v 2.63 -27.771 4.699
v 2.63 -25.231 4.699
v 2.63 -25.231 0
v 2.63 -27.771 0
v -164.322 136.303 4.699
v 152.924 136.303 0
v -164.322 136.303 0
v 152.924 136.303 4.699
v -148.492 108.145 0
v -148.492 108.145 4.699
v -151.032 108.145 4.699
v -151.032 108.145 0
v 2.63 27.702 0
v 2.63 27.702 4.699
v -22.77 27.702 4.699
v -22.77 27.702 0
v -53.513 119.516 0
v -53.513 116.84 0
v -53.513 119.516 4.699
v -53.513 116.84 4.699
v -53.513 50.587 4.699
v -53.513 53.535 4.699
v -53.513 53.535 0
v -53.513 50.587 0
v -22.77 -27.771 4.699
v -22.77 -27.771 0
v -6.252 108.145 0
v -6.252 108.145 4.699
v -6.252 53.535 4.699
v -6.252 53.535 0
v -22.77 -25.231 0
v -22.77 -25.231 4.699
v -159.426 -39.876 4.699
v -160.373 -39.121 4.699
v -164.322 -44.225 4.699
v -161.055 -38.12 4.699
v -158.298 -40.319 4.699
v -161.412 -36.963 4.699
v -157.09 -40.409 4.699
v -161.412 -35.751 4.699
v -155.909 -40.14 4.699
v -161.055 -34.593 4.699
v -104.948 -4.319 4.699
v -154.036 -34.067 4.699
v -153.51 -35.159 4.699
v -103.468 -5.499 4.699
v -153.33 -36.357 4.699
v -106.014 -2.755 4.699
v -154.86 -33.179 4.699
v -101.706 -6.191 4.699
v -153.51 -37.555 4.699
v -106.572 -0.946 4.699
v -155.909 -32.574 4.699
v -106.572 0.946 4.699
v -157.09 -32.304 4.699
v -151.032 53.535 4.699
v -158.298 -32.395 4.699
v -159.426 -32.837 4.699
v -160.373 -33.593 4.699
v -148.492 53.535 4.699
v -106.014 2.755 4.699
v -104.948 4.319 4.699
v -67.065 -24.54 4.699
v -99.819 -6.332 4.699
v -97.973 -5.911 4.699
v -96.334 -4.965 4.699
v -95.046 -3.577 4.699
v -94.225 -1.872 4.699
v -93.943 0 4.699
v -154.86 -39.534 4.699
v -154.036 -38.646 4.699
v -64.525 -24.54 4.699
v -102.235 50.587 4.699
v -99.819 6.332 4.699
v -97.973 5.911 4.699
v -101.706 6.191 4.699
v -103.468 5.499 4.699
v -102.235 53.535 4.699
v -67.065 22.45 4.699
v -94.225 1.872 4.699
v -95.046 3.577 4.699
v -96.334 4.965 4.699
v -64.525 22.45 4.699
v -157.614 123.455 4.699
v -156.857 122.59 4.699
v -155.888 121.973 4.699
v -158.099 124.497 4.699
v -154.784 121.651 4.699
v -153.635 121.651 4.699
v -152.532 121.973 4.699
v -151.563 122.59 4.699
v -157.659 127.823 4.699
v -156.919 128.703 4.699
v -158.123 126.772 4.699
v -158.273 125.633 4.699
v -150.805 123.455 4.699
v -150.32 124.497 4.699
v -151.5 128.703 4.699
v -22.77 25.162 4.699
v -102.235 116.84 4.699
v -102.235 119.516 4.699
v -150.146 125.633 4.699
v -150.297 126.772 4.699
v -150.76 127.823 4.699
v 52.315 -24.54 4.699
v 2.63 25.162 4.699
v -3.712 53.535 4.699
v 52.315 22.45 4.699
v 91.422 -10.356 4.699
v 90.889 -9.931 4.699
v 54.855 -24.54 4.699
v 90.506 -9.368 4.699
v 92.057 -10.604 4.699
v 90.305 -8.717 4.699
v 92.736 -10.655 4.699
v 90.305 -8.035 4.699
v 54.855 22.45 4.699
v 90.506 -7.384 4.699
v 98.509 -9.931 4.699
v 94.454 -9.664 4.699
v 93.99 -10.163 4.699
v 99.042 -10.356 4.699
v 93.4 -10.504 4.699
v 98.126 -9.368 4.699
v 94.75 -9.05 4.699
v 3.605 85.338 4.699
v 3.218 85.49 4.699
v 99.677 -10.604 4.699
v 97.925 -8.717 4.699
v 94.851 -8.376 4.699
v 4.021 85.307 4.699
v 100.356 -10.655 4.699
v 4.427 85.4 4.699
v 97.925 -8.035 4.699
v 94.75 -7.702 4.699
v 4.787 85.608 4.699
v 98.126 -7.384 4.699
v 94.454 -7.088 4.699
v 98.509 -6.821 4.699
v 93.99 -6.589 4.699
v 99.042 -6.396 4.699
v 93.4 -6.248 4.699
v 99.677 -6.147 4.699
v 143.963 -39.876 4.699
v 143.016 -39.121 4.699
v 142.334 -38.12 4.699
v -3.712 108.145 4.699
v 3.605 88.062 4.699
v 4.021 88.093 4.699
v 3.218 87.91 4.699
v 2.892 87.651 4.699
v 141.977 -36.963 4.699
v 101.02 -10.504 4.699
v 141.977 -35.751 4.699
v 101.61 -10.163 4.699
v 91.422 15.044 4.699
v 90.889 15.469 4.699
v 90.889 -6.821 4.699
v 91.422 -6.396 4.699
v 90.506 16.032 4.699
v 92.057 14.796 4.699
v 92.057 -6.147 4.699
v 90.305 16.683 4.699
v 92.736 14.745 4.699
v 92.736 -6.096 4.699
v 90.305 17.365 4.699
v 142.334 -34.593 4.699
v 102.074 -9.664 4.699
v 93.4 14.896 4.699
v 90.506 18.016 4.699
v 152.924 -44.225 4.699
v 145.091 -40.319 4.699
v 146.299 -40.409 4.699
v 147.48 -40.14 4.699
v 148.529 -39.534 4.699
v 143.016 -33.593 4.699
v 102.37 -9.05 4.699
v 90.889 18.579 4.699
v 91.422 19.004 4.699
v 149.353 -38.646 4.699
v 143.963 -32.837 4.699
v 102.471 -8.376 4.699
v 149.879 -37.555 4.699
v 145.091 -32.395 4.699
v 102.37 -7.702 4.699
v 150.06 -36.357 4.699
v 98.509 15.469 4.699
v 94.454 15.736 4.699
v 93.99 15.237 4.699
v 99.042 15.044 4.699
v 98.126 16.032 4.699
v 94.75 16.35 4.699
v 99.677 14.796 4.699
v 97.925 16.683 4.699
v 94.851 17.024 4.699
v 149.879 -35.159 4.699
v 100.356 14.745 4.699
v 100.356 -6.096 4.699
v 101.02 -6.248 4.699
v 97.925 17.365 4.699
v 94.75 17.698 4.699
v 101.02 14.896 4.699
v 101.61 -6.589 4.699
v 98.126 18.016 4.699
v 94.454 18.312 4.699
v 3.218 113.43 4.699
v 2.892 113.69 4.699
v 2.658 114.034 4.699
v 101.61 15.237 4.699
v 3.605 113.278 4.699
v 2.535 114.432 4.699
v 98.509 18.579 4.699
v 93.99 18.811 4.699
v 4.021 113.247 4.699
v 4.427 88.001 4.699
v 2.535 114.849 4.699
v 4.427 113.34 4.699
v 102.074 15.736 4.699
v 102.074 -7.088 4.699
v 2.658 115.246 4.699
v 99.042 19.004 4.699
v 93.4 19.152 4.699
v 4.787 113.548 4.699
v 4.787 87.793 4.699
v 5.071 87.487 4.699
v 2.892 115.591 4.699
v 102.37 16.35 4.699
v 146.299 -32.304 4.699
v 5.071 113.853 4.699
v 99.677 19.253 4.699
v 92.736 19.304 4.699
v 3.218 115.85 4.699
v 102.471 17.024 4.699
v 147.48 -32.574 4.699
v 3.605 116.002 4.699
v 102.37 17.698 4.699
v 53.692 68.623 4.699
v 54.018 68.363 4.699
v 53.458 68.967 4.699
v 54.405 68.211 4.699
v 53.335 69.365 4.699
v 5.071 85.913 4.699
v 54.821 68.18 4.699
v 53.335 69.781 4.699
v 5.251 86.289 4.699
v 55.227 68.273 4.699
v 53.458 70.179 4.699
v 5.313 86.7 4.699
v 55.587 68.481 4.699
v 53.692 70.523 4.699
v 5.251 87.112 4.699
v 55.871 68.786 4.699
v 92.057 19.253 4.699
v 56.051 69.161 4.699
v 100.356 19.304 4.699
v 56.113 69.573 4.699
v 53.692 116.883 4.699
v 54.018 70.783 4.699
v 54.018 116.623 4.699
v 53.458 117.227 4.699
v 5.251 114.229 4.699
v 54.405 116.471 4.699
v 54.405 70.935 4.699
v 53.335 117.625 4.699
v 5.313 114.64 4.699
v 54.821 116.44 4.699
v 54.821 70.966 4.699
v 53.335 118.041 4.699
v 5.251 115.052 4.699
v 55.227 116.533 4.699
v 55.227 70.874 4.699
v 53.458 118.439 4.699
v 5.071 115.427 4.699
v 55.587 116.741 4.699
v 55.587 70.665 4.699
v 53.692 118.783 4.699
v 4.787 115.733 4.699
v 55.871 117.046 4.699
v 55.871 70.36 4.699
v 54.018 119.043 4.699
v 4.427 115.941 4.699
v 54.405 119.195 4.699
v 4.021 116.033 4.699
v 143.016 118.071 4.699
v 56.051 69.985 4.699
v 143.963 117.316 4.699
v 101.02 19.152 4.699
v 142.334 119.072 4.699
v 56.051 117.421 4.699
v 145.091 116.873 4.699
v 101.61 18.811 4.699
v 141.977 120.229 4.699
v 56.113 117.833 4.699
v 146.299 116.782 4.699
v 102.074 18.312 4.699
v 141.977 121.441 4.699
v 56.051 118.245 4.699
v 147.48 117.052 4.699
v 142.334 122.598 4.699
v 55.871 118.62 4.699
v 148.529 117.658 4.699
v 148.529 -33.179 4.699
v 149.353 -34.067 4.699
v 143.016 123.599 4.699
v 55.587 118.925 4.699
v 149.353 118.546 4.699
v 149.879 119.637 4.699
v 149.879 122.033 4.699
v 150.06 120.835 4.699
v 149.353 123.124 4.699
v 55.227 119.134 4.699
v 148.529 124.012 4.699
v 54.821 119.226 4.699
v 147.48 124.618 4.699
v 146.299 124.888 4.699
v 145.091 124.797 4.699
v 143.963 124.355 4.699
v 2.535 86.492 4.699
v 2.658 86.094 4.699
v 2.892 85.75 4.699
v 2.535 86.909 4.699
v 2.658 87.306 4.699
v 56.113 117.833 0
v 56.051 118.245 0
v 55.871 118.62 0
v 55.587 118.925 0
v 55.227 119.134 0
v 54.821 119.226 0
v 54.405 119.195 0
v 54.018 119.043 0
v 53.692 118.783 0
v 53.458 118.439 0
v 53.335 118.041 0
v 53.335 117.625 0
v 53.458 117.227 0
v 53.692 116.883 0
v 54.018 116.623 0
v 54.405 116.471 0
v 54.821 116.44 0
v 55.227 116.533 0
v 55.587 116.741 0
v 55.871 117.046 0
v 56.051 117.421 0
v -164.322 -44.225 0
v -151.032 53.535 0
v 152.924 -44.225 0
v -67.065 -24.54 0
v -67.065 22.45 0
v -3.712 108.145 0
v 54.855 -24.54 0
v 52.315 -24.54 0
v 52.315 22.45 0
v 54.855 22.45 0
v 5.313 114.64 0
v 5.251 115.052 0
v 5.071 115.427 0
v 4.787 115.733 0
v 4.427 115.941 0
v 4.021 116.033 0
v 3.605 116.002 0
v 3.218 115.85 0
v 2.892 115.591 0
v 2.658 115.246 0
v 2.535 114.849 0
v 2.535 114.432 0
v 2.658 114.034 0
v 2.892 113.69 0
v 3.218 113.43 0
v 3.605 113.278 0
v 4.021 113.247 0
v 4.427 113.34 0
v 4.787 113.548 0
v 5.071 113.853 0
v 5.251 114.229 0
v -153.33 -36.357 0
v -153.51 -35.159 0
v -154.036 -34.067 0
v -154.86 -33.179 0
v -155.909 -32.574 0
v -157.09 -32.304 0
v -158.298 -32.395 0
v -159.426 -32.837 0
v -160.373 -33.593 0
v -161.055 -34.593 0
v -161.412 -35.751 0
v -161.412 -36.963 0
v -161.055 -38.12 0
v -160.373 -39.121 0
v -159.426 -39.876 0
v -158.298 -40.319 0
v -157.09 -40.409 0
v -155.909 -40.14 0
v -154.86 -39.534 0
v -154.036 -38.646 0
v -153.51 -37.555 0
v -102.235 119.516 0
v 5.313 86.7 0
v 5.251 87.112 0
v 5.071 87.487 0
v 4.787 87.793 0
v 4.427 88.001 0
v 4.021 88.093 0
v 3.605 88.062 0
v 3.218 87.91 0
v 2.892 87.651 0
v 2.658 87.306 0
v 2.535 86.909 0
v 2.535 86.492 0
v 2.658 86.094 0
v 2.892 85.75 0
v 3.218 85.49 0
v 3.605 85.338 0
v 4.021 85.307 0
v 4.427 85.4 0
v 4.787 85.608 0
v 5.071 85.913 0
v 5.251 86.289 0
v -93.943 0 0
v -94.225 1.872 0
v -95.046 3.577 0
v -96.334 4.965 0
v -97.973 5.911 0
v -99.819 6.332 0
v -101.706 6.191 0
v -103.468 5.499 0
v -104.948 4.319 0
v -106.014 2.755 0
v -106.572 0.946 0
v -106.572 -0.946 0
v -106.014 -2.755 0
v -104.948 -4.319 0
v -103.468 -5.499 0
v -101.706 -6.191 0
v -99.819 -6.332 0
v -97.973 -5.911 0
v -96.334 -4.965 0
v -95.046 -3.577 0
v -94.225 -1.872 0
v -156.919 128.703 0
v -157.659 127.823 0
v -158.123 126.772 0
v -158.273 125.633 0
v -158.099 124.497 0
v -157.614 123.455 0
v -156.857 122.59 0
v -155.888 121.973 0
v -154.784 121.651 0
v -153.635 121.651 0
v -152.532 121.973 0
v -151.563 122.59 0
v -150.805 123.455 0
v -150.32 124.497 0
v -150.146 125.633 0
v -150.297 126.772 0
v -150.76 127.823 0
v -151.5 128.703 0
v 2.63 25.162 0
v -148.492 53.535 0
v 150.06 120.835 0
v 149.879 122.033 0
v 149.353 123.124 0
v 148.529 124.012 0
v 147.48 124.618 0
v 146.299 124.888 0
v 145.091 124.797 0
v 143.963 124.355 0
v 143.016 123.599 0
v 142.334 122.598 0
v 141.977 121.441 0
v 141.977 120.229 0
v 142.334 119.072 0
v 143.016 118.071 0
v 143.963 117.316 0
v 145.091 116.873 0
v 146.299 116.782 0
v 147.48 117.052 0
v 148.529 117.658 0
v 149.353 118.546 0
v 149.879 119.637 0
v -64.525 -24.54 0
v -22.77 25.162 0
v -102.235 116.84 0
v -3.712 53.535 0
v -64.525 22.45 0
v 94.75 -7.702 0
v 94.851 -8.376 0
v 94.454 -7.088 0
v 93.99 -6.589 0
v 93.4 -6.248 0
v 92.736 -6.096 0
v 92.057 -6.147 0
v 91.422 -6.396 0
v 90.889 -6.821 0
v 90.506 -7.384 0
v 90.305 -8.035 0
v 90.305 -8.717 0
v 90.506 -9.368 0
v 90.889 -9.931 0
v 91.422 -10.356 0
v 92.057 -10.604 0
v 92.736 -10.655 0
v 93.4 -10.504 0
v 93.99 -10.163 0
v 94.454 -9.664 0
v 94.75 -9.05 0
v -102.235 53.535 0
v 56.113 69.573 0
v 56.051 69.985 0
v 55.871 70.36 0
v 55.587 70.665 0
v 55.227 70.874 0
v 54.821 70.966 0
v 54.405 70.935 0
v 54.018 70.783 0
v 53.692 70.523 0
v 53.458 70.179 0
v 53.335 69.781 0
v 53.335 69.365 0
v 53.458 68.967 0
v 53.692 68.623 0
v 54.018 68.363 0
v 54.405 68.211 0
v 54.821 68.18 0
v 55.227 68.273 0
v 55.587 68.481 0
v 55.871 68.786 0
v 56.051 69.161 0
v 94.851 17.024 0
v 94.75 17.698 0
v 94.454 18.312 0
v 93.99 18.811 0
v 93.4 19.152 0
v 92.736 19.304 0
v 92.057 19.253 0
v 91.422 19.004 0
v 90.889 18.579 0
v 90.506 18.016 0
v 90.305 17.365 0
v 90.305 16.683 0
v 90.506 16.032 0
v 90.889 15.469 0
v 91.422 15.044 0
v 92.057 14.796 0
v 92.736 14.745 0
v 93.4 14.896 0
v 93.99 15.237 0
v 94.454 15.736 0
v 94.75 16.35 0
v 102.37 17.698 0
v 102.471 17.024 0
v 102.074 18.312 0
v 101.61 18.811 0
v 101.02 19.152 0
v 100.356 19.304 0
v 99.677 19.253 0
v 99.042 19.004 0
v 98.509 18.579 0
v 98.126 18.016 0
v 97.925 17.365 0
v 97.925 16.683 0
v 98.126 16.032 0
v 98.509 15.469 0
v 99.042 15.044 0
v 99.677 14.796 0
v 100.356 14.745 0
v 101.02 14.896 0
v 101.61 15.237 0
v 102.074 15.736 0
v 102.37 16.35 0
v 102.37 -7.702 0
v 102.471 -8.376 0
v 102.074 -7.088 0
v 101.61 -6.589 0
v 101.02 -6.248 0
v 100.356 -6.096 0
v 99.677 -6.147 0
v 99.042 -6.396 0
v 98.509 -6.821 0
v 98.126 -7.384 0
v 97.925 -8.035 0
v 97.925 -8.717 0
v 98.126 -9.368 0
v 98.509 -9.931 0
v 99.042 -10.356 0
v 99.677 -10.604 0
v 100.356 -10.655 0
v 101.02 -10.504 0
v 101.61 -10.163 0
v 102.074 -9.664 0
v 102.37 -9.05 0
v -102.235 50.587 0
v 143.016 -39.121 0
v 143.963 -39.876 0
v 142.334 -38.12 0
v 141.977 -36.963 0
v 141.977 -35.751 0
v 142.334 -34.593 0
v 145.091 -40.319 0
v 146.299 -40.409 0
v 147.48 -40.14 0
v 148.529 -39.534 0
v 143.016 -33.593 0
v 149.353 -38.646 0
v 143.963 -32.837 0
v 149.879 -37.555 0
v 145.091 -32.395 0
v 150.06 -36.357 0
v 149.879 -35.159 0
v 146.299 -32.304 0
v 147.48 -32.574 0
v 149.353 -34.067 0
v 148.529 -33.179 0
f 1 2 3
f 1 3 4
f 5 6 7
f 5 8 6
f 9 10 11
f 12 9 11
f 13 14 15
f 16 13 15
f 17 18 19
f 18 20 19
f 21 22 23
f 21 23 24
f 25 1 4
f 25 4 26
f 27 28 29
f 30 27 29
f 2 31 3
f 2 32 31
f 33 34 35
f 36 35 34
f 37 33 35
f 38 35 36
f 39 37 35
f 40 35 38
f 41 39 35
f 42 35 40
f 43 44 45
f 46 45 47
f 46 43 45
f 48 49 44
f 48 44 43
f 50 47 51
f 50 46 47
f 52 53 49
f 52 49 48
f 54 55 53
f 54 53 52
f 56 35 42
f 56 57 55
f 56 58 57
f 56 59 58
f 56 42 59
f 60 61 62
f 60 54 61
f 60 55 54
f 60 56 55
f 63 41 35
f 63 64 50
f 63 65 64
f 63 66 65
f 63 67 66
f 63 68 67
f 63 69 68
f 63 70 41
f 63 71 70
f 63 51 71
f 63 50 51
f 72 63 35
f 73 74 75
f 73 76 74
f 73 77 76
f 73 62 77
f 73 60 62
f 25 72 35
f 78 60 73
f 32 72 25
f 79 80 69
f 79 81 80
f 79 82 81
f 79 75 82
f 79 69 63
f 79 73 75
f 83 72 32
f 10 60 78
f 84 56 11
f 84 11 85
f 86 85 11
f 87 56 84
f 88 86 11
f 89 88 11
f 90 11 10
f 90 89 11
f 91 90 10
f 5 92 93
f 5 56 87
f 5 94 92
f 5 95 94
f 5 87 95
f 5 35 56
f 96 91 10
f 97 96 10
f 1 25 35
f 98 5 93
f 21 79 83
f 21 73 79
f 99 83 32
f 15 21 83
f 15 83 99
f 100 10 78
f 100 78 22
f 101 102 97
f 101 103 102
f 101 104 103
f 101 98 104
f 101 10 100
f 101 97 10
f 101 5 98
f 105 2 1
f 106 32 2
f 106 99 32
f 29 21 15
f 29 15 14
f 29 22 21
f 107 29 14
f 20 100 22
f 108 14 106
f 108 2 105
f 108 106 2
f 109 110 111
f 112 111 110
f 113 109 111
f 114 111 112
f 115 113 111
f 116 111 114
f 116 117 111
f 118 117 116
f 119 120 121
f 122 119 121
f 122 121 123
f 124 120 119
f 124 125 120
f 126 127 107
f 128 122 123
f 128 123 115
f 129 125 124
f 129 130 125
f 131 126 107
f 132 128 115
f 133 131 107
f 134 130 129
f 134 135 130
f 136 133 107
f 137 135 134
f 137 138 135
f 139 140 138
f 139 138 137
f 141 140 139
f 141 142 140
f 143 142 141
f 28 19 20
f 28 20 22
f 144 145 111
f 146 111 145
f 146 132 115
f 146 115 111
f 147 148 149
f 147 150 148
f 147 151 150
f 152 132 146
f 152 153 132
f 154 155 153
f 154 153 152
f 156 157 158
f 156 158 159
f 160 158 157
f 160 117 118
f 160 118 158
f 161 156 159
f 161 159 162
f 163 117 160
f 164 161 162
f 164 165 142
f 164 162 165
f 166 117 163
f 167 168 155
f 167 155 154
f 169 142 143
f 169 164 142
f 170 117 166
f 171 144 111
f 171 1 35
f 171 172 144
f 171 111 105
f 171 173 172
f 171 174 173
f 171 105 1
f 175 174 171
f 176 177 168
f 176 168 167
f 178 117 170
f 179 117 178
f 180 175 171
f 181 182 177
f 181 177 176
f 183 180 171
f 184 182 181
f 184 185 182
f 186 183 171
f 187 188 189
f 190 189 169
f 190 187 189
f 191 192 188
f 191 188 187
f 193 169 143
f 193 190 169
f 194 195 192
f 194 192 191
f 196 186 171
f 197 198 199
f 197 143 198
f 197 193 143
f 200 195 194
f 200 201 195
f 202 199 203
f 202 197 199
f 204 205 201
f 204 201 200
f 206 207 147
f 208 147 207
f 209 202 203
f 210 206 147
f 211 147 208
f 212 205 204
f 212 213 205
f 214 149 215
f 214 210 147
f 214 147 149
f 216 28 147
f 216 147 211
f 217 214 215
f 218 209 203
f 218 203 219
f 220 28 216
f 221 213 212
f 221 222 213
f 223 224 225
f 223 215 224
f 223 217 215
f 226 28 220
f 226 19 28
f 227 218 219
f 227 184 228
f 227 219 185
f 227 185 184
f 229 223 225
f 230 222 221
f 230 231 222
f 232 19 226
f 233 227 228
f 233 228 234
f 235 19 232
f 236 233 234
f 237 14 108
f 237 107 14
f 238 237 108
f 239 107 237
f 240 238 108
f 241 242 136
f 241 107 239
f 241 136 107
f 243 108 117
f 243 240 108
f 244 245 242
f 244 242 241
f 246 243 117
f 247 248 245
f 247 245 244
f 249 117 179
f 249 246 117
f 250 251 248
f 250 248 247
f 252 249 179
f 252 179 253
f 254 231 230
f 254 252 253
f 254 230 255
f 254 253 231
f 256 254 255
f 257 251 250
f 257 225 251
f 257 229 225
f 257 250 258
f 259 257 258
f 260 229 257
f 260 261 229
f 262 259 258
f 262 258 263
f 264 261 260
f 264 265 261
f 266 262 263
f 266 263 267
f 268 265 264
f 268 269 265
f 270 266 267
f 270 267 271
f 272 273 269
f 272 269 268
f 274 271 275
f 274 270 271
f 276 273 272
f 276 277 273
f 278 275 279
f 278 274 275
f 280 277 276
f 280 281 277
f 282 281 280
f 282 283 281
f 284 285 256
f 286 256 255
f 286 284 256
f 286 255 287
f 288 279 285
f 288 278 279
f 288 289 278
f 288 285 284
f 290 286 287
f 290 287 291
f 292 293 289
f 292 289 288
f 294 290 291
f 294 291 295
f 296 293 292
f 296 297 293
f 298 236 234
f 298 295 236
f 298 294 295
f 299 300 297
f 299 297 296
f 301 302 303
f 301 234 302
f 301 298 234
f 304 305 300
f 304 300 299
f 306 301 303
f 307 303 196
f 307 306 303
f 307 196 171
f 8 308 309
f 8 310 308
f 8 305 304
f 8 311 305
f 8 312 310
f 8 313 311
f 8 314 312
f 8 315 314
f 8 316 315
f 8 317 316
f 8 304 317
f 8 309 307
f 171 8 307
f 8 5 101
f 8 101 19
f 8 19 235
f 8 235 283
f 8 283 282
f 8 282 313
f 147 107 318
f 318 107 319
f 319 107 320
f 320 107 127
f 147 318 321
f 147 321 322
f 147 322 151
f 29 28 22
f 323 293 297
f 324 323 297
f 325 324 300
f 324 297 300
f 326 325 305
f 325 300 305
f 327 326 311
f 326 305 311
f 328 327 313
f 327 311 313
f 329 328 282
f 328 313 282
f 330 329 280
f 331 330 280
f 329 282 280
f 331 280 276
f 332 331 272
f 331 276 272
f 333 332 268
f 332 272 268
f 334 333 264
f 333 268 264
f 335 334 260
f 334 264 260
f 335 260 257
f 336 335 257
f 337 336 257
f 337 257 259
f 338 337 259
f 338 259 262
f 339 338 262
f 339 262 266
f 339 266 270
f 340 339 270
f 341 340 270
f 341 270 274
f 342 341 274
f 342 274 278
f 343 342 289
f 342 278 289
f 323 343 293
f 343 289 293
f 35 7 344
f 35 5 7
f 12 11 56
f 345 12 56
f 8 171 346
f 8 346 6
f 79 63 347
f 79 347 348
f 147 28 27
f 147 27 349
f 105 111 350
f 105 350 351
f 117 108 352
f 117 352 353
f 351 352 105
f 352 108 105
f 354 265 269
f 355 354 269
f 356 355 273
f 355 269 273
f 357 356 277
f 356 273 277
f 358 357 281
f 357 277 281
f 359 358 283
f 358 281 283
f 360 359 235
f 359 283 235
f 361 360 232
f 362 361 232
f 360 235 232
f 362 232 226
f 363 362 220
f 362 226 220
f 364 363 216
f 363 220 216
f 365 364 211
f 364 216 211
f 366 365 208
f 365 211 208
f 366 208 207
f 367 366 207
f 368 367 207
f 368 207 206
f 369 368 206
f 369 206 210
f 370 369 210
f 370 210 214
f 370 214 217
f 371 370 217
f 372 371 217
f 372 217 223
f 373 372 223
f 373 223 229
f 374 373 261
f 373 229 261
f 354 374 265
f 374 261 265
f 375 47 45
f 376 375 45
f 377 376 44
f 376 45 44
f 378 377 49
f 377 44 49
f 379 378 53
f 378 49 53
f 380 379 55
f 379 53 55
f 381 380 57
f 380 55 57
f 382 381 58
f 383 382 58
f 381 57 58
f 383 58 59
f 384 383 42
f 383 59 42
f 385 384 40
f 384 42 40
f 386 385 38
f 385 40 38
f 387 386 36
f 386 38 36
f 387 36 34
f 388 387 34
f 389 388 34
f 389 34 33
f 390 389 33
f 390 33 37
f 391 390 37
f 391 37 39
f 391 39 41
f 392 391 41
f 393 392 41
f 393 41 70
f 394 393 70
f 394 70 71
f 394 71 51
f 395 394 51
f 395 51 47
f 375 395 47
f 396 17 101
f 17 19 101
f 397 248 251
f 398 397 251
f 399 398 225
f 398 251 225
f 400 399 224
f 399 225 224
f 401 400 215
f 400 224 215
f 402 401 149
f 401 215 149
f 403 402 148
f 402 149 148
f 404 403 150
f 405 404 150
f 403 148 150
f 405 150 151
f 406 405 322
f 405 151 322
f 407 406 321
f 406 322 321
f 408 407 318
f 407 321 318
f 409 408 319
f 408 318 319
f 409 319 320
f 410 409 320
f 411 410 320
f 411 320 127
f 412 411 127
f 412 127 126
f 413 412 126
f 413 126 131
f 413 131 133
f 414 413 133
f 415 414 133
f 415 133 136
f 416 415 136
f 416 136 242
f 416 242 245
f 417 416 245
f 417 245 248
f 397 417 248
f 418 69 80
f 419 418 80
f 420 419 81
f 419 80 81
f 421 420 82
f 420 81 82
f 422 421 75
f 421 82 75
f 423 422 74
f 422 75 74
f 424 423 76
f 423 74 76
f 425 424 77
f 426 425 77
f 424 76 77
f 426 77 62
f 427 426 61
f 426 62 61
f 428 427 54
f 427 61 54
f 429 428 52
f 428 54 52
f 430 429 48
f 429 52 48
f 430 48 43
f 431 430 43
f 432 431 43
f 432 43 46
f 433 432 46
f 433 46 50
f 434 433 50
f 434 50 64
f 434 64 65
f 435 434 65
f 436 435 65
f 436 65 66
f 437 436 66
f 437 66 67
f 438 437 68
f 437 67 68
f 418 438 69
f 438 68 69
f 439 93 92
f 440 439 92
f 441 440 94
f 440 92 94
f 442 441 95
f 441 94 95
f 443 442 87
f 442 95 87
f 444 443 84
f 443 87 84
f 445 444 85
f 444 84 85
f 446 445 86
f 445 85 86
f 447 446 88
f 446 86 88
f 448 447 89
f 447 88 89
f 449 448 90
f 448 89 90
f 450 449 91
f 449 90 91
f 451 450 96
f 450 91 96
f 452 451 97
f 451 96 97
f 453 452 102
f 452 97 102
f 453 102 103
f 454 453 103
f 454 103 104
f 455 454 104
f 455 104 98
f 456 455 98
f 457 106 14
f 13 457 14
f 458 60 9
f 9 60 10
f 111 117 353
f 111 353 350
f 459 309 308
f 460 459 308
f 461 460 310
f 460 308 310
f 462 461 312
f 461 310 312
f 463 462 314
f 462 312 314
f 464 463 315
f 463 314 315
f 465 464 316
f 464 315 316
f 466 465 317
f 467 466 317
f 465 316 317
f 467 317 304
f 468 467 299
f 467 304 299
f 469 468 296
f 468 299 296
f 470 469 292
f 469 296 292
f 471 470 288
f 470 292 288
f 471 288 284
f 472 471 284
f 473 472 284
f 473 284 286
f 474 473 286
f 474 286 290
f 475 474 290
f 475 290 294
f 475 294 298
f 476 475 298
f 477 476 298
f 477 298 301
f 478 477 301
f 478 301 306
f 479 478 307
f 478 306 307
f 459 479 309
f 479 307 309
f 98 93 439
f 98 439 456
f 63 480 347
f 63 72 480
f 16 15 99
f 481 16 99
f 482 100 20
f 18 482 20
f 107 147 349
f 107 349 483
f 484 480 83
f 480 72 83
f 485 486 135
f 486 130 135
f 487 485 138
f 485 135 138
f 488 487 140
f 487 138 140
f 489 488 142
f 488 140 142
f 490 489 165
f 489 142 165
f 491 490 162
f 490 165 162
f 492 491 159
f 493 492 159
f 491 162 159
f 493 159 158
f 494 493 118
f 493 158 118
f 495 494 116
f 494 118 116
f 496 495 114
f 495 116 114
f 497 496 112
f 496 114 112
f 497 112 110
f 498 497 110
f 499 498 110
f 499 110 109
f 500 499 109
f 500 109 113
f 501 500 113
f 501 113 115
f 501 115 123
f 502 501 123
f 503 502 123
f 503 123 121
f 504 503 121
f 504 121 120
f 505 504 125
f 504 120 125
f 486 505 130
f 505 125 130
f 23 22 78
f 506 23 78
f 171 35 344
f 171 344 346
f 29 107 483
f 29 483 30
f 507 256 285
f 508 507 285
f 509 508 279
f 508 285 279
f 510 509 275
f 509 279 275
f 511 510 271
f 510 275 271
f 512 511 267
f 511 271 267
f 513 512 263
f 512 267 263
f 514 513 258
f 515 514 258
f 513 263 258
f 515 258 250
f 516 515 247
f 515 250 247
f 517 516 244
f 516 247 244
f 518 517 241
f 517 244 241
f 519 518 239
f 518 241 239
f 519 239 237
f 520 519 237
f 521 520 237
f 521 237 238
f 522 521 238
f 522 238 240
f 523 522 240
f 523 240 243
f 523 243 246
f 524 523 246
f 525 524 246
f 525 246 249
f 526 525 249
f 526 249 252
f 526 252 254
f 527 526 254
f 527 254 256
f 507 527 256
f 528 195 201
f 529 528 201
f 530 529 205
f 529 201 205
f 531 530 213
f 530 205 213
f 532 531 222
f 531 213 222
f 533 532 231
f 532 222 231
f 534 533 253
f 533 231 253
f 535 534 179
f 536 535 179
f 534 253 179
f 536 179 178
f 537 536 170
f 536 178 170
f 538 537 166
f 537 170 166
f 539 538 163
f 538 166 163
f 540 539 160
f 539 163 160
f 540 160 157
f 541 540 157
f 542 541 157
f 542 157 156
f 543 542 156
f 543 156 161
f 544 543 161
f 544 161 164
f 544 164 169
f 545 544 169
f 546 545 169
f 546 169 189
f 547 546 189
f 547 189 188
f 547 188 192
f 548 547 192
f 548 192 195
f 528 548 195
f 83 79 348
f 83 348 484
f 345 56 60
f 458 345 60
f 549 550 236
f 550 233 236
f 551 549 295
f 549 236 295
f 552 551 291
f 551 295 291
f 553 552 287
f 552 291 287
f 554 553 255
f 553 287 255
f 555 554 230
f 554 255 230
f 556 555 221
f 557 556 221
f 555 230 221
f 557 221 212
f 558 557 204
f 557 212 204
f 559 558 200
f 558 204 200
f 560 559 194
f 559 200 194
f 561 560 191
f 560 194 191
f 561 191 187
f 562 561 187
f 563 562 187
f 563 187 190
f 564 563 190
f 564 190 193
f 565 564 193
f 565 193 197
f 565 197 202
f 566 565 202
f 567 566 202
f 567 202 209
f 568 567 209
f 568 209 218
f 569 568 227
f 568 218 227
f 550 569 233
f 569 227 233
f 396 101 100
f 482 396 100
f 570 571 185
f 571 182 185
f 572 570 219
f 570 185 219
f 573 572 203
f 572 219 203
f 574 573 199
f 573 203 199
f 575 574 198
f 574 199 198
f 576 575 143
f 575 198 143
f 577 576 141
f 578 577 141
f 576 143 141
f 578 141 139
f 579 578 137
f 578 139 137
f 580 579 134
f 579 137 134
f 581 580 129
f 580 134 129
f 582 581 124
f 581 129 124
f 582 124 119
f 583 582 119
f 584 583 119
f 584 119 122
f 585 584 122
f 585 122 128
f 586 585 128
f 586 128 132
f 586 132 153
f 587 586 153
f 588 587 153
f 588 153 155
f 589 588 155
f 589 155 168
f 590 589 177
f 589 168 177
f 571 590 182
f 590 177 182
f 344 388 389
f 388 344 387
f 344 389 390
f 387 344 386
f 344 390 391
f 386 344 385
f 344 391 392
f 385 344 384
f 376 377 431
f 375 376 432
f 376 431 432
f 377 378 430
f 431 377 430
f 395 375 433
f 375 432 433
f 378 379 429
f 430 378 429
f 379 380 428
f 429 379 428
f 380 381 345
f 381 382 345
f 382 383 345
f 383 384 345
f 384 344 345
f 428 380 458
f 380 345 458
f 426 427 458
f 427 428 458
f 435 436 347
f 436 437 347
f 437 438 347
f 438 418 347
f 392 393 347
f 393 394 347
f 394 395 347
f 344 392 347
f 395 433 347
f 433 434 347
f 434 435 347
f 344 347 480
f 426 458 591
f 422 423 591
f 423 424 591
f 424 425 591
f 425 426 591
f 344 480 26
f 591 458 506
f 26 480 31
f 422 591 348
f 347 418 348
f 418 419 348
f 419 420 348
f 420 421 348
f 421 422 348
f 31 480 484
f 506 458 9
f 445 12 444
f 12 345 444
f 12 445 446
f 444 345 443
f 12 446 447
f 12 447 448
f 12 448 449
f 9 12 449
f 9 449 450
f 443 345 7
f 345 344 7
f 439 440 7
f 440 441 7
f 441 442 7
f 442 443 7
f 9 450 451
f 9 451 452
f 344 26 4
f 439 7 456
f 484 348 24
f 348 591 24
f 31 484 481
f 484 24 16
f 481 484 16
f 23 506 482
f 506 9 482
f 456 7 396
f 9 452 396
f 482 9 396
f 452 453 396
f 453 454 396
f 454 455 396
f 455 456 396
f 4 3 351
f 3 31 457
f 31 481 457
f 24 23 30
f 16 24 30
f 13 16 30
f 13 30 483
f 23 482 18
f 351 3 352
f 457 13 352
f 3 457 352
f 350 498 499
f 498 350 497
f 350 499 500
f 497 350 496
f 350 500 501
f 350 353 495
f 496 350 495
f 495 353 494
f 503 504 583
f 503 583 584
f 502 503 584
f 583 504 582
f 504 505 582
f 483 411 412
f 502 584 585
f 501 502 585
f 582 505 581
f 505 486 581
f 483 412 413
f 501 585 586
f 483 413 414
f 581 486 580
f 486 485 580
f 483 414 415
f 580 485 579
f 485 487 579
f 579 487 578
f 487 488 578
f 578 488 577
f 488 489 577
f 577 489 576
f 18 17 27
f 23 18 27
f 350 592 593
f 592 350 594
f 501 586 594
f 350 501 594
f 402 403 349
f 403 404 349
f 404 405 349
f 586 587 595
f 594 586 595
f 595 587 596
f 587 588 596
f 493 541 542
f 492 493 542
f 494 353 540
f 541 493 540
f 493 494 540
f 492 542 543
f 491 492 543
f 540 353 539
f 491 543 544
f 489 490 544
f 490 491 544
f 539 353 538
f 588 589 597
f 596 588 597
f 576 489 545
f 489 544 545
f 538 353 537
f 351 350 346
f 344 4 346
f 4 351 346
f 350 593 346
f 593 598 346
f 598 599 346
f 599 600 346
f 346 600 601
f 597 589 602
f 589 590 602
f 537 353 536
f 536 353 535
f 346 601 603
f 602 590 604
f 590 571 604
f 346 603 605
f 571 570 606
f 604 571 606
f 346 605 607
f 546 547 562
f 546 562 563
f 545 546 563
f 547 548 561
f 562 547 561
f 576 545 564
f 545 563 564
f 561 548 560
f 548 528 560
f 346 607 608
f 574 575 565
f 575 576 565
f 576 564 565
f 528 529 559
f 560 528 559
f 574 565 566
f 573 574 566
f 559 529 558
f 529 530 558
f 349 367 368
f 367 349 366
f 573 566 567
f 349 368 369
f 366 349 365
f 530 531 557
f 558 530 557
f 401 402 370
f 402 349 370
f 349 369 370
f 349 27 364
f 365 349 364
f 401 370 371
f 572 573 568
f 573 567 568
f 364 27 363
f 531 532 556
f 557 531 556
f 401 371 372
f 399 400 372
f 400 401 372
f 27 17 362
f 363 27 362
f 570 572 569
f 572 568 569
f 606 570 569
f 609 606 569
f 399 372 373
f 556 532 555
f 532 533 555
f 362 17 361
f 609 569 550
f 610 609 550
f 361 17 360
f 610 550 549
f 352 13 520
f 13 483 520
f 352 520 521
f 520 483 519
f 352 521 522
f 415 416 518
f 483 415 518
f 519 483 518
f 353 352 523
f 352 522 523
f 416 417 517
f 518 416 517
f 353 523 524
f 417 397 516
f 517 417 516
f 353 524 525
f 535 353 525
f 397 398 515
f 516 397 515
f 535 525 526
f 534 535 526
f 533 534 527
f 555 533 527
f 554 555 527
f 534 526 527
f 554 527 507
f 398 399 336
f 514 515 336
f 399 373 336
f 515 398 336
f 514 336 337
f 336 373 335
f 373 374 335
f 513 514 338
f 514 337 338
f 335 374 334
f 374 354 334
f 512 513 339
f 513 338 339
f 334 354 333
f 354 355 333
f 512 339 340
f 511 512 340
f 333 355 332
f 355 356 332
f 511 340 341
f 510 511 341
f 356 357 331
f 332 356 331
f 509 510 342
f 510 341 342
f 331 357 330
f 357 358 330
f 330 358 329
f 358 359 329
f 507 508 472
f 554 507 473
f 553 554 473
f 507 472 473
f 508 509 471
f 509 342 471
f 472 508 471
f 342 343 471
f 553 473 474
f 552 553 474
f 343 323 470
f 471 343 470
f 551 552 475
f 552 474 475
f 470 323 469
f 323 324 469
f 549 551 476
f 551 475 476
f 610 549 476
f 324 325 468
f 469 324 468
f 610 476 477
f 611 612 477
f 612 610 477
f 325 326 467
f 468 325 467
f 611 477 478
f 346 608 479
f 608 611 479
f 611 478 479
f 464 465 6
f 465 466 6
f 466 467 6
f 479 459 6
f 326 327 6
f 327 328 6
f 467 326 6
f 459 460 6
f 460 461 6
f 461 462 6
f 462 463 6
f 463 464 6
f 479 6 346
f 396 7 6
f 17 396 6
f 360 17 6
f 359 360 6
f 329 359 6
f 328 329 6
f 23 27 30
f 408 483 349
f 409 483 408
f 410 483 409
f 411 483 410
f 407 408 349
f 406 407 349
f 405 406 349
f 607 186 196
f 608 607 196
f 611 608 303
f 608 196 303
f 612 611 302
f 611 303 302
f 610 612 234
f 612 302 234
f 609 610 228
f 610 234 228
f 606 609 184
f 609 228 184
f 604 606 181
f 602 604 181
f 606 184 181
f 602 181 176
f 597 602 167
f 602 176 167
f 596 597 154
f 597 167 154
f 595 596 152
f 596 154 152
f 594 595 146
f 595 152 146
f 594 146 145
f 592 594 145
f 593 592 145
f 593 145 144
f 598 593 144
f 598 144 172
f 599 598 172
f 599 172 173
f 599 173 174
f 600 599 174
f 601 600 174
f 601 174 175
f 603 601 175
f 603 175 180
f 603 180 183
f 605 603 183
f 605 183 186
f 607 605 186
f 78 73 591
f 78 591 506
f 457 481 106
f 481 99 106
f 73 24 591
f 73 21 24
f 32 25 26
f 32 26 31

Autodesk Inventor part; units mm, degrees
ref_plane "YZ Plane" through (0, 0, 0) normal (1, 0, 0) x (0, 1, 0)
ref_plane "XZ Plane" through (0, 0, 0) normal (0, 1, 0) x (-1, 0, 0)
ref_plane "XY Plane" through (0, 0, 0) normal (0, 0, 1) x (1, 0, 0)
sketch "Sketch1" plane through (0, 0, 0) normal (0, 0, 1) x (1, 0, 0)
  line L0 (-164.322, 128.7031) -> (152.924, 128.7031)
  line L1 (152.924, 128.7031) -> (152.924, -133.4523)
  line L2 (152.924, -133.4523) -> (-164.322, -133.4523)
  line L3 (-164.322, -133.4523) -> (-164.322, 128.7031)
  point P0 (0, 0)
  dimension "d0" = 317.246
extrude "Extrusion1" add sketch "Sketch1" along normal blind 4.699
sketch "Sketch2" plane through (0, 0, 4.699) normal (0, 0, 1) x (1, 0, 0)
  line L0 (-22.7697, 25.1619) -> (2.6303, 25.1619)
  line L1 (52.3147, 22.4498) -> (52.3147, -24.5402)
  line L2 (-64.5253, -24.5402) -> (-64.5253, 22.4498)
  line L3 (52.3147, 22.4498) -> (54.8547, 22.4498)
  line L4 (54.8547, 22.4498) -> (54.8547, -24.5402)
  line L5 (54.8547, -24.5402) -> (52.3147, -24.5402)
  line L6 (52.3147, -24.5402) -> (52.3147, 22.4498)
  line L7 (-64.5253, -24.5402) -> (-67.0653, -24.5402)
  line L8 (-67.0653, -24.5402) -> (-67.0653, 22.4498)
  line L9 (-67.0653, 22.4498) -> (-64.5253, 22.4498)
  line L10 (-64.5253, 22.4498) -> (-64.5253, -24.5402)
  line L11 (-22.7697, 25.1619) -> (2.6303, 25.1619)
  line L12 (2.6303, 25.1619) -> (2.6303, 27.7019)
  line L13 (2.6303, 27.7019) -> (-22.7697, 27.7019)
  line L14 (-22.7697, 27.7019) -> (-22.7697, 25.1619)
  line L15 (-22.7697, -25.2309) -> (2.6303, -25.2309)
  line L16 (2.6303, -25.2309) -> (2.6303, -27.7709)
  line L17 (2.6303, -27.7709) -> (-22.7697, -27.7709)
  line L18 (-22.7697, -27.7709) -> (-22.7697, -25.2309)
  circle A0 centre (92.5652, 17.0242) radius 2.286
  circle A1 centre (100.1852, 17.0242) radius 2.286
  circle A2 centre (92.5652, -8.3758) radius 2.286
  circle A3 centre (100.1852, -8.3758) radius 2.286
  line L19 (3.9163, 100.2262) -> (59.1645, 100.2262)
  circle A4 centre (54.7163, 69.5732) radius 1.397
  circle A5 centre (54.7163, 117.8332) radius 1.397
  circle A6 centre (3.9163, 114.6403) radius 1.397
  circle A7 centre (3.9163, 86.7003) radius 1.397
  point P0 (0, 0)
  dimension "d3" = 116.84
  dimension "d4" = 46.99
  dimension "d5" = 2.54
  dimension "d6" = 2.54
  dimension "d7" = 25.4
  dimension "d8" = 2.54
  dimension "d9" = 2.54
  dimension "d12" = 4.572
  dimension "d31" = 25.4
  dimension "d32" = 25.4
extrude "Extrusion2" cut sketch "Sketch2" against normal blind 25.4
sketch "Sketch3" plane through (0, 0, 4.699) normal (0, 0, 1) x (1, 0, 0)
  line L0 (-164.322, 128.7031) -> (-164.322, -133.4523) projected
  line L1 (152.924, 128.7031) -> (152.924, -133.4523) projected
  line L2 (-164.322, -44.2248) -> (152.924, -44.2248)
  line L3 (152.924, -44.2248) -> (152.924, -133.4523)
  line L4 (152.924, -133.4523) -> (-164.322, -133.4523)
  line L5 (-164.322, -133.4523) -> (-164.322, -44.2248)
  point P0 (0, 0)
extrude "Extrusion3" cut sketch "Sketch3" against normal blind 25.4
sketch "Sketch4" plane through (0, 0, 4.699) normal (0, 0, 1) x (1, 0, 0)
  line L0 (-102.2349, 116.84) -> (-53.5128, 116.84)
  line L1 (-6.2523, 108.1454) -> (-6.2523, 44.8408)
  line L2 (-53.5128, 53.5354) -> (-102.2349, 53.5354)
  line L3 (-148.4923, 53.5354) -> (-148.4923, 108.1454)
  line L4 (-148.4923, 108.1454) -> (-151.0323, 108.1454)
  line L5 (-151.0323, 108.1454) -> (-151.0323, 53.5354)
  line L6 (-151.0323, 53.5354) -> (-148.4923, 53.5354)
  line L7 (-148.4923, 53.5354) -> (-148.4923, 108.1454)
  line L8 (-6.2523, 108.1454) -> (-3.7123, 108.1454)
  line L9 (-3.7123, 108.1454) -> (-3.7123, 53.5354)
  line L10 (-3.7123, 53.5354) -> (-6.2523, 53.5354)
  line L11 (-6.2523, 53.5354) -> (-6.2523, 108.1454)
  line L12 (-102.2349, 116.84) -> (-53.5128, 116.84)
  line L13 (-53.5128, 116.84) -> (-53.5128, 119.5161)
  line L14 (-53.5128, 119.5161) -> (-102.2349, 119.5161)
  line L15 (-102.2349, 119.5161) -> (-102.2349, 116.84)
  line L16 (-102.2349, 53.5354) -> (-53.5128, 53.5354)
  line L17 (-53.5128, 53.5354) -> (-53.5128, 50.5868)
  line L18 (-53.5128, 50.5868) -> (-102.2349, 50.5868)
  line L19 (-102.2349, 50.5868) -> (-102.2349, 53.5354)
  circle A0 centre (-100.2931, 0) radius 6.35
  point P0 (0, 0)
  dimension "d21" = 142.24
  dimension "d22" = 2.54
  dimension "d23" = 2.54
  dimension "d24" = 12.7
  dimension "d25" = 54.61
extrude "Extrusion4" cut sketch "Sketch4" against normal blind 25.4
sketch "Sketch5" plane through (0, 0, 4.699) normal (0, 0, 1) x (1, 0, 0)
  circle A0 centre (-154.2096, 125.6742) radius 4.064
  line L0 (-6.2523, 53.5354) -> (-6.2523, 108.1454) projected
  line L1 (-6.2523, 108.1454) -> (-3.7123, 108.1454) projected
  line L2 (-3.7123, 108.1454) -> (-3.7123, 53.5354) projected
  line L3 (-3.7123, 53.5354) -> (-6.2523, 53.5354) projected
  line L4 (-102.2349, 116.84) -> (-102.2349, 119.5161) projected
  line L5 (-102.2349, 119.5161) -> (-53.5128, 119.5161) projected
  line L6 (-53.5128, 119.5161) -> (-53.5128, 116.84) projected
  line L7 (-53.5128, 116.84) -> (-102.2349, 116.84) projected
  circle A1 centre (-100.2931, 0) radius 6.35 projected
  line L8 (-151.0323, 53.5354) -> (-151.0323, 108.1454) projected
  line L9 (-151.0323, 108.1454) -> (-148.4923, 108.1454) projected
  line L10 (-148.4923, 108.1454) -> (-148.4923, 53.5354) projected
  line L11 (-148.4923, 53.5354) -> (-151.0323, 53.5354) projected
  line L12 (-102.2349, 53.5354) -> (-53.5128, 53.5354) projected
  line L13 (-53.5128, 53.5354) -> (-53.5128, 50.5868) projected
  line L14 (-53.5128, 50.5868) -> (-102.2349, 50.5868) projected
  line L15 (-102.2349, 50.5868) -> (-102.2349, 53.5354) projected
  line L16 (-164.322, -44.2248) -> (152.924, -44.2248) projected
  line L17 (152.924, -44.2248) -> (152.924, 128.7031) projected
  line L18 (152.924, 128.7031) -> (-164.322, 128.7031) projected
  line L19 (-164.322, 128.7031) -> (-164.322, -44.2248) projected
  line L20 (-164.322, 128.7031) -> (152.924, 128.7031) projected
  line L21 (-5.699, 128.7031) -> (-5.699, 116.84)
  circle A2 centre (145.9955, 120.8351) radius 4.064
  line L22 (-164.322, -44.2248) -> (-164.322, 128.7031) projected
  line L23 (-164.322, 42.2392) -> (-157.3936, 42.2392)
  circle A3 centre (-157.3936, -36.3568) radius 4.064
  circle A4 centre (145.9955, -36.3568) radius 4.064
  point P0 (0, 0)
  dimension "d28" = 8.128
extrude "Extrusion5" cut sketch "Sketch5" against normal blind 25.4 contours A0 L18 | L18 A0 | A2 | A3 | A4
sketch "Sketch6" plane through (0, 0, 4.699) normal (0, 0, 1) x (1, 0, 0)
  circle A0 centre (-157.3936, -36.3568) radius 4.064 projected
  arc A1 (-156.9191, 128.7031) -> (-151.5, 128.7031) centre (-154.2096, 125.6742) ccw projected
  circle A2 centre (145.9955, 120.8351) radius 4.064 projected
  circle A3 centre (145.9955, -36.3568) radius 4.064 projected
  line L0 (-6.2523, 53.5354) -> (-6.2523, 108.1454) projected
  line L1 (-6.2523, 108.1454) -> (-3.7123, 108.1454) projected
  line L2 (-3.7123, 108.1454) -> (-3.7123, 53.5354) projected
  line L3 (-3.7123, 53.5354) -> (-6.2523, 53.5354) projected
  line L4 (-102.2349, 116.84) -> (-102.2349, 119.5161) projected
  line L5 (-102.2349, 119.5161) -> (-53.5128, 119.5161) projected
  line L6 (-53.5128, 119.5161) -> (-53.5128, 116.84) projected
  line L7 (-53.5128, 116.84) -> (-102.2349, 116.84) projected
  circle A4 centre (-100.2931, 0) radius 6.35 projected
  line L8 (-151.0323, 53.5354) -> (-151.0323, 108.1454) projected
  line L9 (-151.0323, 108.1454) -> (-148.4923, 108.1454) projected
  line L10 (-148.4923, 108.1454) -> (-148.4923, 53.5354) projected
  line L11 (-148.4923, 53.5354) -> (-151.0323, 53.5354) projected
  line L12 (-102.2349, 53.5354) -> (-53.5128, 53.5354) projected
  line L13 (-53.5128, 53.5354) -> (-53.5128, 50.5868) projected
  line L14 (-53.5128, 50.5868) -> (-102.2349, 50.5868) projected
  line L15 (-102.2349, 50.5868) -> (-102.2349, 53.5354) projected
  line L16 (-164.322, -44.2248) -> (152.924, -44.2248) projected
  line L17 (152.924, -44.2248) -> (152.924, 128.7031) projected
  line L18 (152.924, 128.7031) -> (-151.5, 128.7031) projected
  line L19 (-164.322, 128.7031) -> (-164.322, -44.2248) projected
  line L20 (-64.5253, 22.4498) -> (-64.5253, -24.5402) projected
  line L21 (-64.5253, -24.5402) -> (-67.0653, -24.5402) projected
  line L22 (-67.0653, -24.5402) -> (-67.0653, 22.4498) projected
  line L23 (-67.0653, 22.4498) -> (-64.5253, 22.4498) projected
  line L24 (-22.7697, -27.7709) -> (-22.7697, -25.2309) projected
  line L25 (-22.7697, -25.2309) -> (2.6303, -25.2309) projected
  line L26 (2.6303, -25.2309) -> (2.6303, -27.7709) projected
  line L27 (2.6303, -27.7709) -> (-22.7697, -27.7709) projected
  circle A5 centre (100.1852, -8.3758) radius 2.286 projected
  circle A6 centre (100.1852, 17.0242) radius 2.286 projected
  circle A7 centre (54.7163, 117.8332) radius 1.397 projected
  circle A8 centre (54.7163, 69.5732) radius 1.397 projected
  circle A9 centre (3.9163, 86.7003) radius 1.397 projected
  circle A10 centre (3.9163, 114.6403) radius 1.397 projected
  circle A11 centre (92.5652, 17.0242) radius 2.286 projected
  circle A12 centre (92.5652, -8.3758) radius 2.286 projected
  line L28 (-22.7697, 25.1619) -> (-22.7697, 27.7019) projected
  line L29 (-22.7697, 27.7019) -> (2.6303, 27.7019) projected
  line L30 (2.6303, 27.7019) -> (2.6303, 25.1619) projected
  line L31 (2.6303, 25.1619) -> (-22.7697, 25.1619) projected
  line L32 (52.3147, -24.5402) -> (52.3147, 22.4498) projected
  line L33 (52.3147, 22.4498) -> (54.8547, 22.4498) projected
  line L34 (54.8547, 22.4498) -> (54.8547, -24.5402) projected
  line L35 (54.8547, -24.5402) -> (52.3147, -24.5402) projected
  line L36 (-164.322, 128.7031) -> (152.924, 128.7031) projected
  line L37 (-164.322, 128.7031) -> (152.924, 128.7031)
  line L38 (152.924, 128.7031) -> (152.924, 136.3029)
  line L39 (152.924, 136.3029) -> (-164.322, 136.3029)
  line L40 (-164.322, 136.3029) -> (-164.322, 128.7031)
  line L41 (-156.9191, 128.7031) -> (-164.322, 128.7031) projected
  point P0 (0, 0)
extrude "Extrusion6" add sketch "Sketch6" against normal blind 4.699 contours L36 L40 L39 L38 L18
sketch "Sketch7" plane through (0, 0, 4.699) normal (0, 0, 1) x (1, 0, 0)
  arc A0 (-156.9191, 128.7031) -> (-151.5, 128.7031) centre (-154.2096, 125.6742) ccw projected
  line L0 (-156.9191, 128.7031) -> (-151.5, 128.7031) projected
  line L1 (152.924, -44.2248) -> (152.924, 136.3029) projected
  line L2 (152.924, 136.3029) -> (-164.322, 136.3029) projected
  line L3 (-164.322, 136.3029) -> (-164.322, -44.2248) projected
  line L4 (-164.322, -44.2248) -> (152.924, -44.2248) projected
  circle A1 centre (-157.3936, -36.3568) radius 4.064 projected
  circle A2 centre (145.9955, 120.8351) radius 4.064 projected
  circle A3 centre (145.9955, -36.3568) radius 4.064 projected
  line L5 (-6.2523, 53.5354) -> (-6.2523, 108.1454) projected
  line L6 (-6.2523, 108.1454) -> (-3.7123, 108.1454) projected
  line L7 (-3.7123, 108.1454) -> (-3.7123, 53.5354) projected
  line L8 (-3.7123, 53.5354) -> (-6.2523, 53.5354) projected
  line L9 (-102.2349, 116.84) -> (-102.2349, 119.5161) projected
  line L10 (-102.2349, 119.5161) -> (-53.5128, 119.5161) projected
  line L11 (-53.5128, 119.5161) -> (-53.5128, 116.84) projected
  line L12 (-53.5128, 116.84) -> (-102.2349, 116.84) projected
  circle A4 centre (-100.2931, 0) radius 6.35 projected
  line L13 (-151.0323, 53.5354) -> (-151.0323, 108.1454) projected
  line L14 (-151.0323, 108.1454) -> (-148.4923, 108.1454) projected
  line L15 (-148.4923, 108.1454) -> (-148.4923, 53.5354) projected
  line L16 (-148.4923, 53.5354) -> (-151.0323, 53.5354) projected
  line L17 (-102.2349, 53.5354) -> (-53.5128, 53.5354) projected
  line L18 (-53.5128, 53.5354) -> (-53.5128, 50.5868) projected
  line L19 (-53.5128, 50.5868) -> (-102.2349, 50.5868) projected
  line L20 (-102.2349, 50.5868) -> (-102.2349, 53.5354) projected
  line L21 (-64.5253, 22.4498) -> (-64.5253, -24.5402) projected
  line L22 (-64.5253, -24.5402) -> (-67.0653, -24.5402) projected
  line L23 (-67.0653, -24.5402) -> (-67.0653, 22.4498) projected
  line L24 (-67.0653, 22.4498) -> (-64.5253, 22.4498) projected
  line L25 (-22.7697, -27.7709) -> (-22.7697, -25.2309) projected
  line L26 (-22.7697, -25.2309) -> (2.6303, -25.2309) projected
  line L27 (2.6303, -25.2309) -> (2.6303, -27.7709) projected
  line L28 (2.6303, -27.7709) -> (-22.7697, -27.7709) projected
  circle A5 centre (100.1852, -8.3758) radius 2.286 projected
  circle A6 centre (100.1852, 17.0242) radius 2.286 projected
  circle A7 centre (54.7163, 117.8332) radius 1.397 projected
  circle A8 centre (54.7163, 69.5732) radius 1.397 projected
  circle A9 centre (3.9163, 86.7003) radius 1.397 projected
  circle A10 centre (3.9163, 114.6403) radius 1.397 projected
  circle A11 centre (92.5652, 17.0242) radius 2.286 projected
  circle A12 centre (92.5652, -8.3758) radius 2.286 projected
  line L29 (-22.7697, 25.1619) -> (-22.7697, 27.7019) projected
  line L30 (-22.7697, 27.7019) -> (2.6303, 27.7019) projected
  line L31 (2.6303, 27.7019) -> (2.6303, 25.1619) projected
  line L32 (2.6303, 25.1619) -> (-22.7697, 25.1619) projected
  line L33 (52.3147, -24.5402) -> (52.3147, 22.4498) projected
  line L34 (52.3147, 22.4498) -> (54.8547, 22.4498) projected
  line L35 (54.8547, 22.4498) -> (54.8547, -24.5402) projected
  line L36 (54.8547, -24.5402) -> (52.3147, -24.5402) projected
  circle A13 centre (-154.2096, 125.6742) radius 4.064
  point P0 (0, 0)
properties part number "bottom"
